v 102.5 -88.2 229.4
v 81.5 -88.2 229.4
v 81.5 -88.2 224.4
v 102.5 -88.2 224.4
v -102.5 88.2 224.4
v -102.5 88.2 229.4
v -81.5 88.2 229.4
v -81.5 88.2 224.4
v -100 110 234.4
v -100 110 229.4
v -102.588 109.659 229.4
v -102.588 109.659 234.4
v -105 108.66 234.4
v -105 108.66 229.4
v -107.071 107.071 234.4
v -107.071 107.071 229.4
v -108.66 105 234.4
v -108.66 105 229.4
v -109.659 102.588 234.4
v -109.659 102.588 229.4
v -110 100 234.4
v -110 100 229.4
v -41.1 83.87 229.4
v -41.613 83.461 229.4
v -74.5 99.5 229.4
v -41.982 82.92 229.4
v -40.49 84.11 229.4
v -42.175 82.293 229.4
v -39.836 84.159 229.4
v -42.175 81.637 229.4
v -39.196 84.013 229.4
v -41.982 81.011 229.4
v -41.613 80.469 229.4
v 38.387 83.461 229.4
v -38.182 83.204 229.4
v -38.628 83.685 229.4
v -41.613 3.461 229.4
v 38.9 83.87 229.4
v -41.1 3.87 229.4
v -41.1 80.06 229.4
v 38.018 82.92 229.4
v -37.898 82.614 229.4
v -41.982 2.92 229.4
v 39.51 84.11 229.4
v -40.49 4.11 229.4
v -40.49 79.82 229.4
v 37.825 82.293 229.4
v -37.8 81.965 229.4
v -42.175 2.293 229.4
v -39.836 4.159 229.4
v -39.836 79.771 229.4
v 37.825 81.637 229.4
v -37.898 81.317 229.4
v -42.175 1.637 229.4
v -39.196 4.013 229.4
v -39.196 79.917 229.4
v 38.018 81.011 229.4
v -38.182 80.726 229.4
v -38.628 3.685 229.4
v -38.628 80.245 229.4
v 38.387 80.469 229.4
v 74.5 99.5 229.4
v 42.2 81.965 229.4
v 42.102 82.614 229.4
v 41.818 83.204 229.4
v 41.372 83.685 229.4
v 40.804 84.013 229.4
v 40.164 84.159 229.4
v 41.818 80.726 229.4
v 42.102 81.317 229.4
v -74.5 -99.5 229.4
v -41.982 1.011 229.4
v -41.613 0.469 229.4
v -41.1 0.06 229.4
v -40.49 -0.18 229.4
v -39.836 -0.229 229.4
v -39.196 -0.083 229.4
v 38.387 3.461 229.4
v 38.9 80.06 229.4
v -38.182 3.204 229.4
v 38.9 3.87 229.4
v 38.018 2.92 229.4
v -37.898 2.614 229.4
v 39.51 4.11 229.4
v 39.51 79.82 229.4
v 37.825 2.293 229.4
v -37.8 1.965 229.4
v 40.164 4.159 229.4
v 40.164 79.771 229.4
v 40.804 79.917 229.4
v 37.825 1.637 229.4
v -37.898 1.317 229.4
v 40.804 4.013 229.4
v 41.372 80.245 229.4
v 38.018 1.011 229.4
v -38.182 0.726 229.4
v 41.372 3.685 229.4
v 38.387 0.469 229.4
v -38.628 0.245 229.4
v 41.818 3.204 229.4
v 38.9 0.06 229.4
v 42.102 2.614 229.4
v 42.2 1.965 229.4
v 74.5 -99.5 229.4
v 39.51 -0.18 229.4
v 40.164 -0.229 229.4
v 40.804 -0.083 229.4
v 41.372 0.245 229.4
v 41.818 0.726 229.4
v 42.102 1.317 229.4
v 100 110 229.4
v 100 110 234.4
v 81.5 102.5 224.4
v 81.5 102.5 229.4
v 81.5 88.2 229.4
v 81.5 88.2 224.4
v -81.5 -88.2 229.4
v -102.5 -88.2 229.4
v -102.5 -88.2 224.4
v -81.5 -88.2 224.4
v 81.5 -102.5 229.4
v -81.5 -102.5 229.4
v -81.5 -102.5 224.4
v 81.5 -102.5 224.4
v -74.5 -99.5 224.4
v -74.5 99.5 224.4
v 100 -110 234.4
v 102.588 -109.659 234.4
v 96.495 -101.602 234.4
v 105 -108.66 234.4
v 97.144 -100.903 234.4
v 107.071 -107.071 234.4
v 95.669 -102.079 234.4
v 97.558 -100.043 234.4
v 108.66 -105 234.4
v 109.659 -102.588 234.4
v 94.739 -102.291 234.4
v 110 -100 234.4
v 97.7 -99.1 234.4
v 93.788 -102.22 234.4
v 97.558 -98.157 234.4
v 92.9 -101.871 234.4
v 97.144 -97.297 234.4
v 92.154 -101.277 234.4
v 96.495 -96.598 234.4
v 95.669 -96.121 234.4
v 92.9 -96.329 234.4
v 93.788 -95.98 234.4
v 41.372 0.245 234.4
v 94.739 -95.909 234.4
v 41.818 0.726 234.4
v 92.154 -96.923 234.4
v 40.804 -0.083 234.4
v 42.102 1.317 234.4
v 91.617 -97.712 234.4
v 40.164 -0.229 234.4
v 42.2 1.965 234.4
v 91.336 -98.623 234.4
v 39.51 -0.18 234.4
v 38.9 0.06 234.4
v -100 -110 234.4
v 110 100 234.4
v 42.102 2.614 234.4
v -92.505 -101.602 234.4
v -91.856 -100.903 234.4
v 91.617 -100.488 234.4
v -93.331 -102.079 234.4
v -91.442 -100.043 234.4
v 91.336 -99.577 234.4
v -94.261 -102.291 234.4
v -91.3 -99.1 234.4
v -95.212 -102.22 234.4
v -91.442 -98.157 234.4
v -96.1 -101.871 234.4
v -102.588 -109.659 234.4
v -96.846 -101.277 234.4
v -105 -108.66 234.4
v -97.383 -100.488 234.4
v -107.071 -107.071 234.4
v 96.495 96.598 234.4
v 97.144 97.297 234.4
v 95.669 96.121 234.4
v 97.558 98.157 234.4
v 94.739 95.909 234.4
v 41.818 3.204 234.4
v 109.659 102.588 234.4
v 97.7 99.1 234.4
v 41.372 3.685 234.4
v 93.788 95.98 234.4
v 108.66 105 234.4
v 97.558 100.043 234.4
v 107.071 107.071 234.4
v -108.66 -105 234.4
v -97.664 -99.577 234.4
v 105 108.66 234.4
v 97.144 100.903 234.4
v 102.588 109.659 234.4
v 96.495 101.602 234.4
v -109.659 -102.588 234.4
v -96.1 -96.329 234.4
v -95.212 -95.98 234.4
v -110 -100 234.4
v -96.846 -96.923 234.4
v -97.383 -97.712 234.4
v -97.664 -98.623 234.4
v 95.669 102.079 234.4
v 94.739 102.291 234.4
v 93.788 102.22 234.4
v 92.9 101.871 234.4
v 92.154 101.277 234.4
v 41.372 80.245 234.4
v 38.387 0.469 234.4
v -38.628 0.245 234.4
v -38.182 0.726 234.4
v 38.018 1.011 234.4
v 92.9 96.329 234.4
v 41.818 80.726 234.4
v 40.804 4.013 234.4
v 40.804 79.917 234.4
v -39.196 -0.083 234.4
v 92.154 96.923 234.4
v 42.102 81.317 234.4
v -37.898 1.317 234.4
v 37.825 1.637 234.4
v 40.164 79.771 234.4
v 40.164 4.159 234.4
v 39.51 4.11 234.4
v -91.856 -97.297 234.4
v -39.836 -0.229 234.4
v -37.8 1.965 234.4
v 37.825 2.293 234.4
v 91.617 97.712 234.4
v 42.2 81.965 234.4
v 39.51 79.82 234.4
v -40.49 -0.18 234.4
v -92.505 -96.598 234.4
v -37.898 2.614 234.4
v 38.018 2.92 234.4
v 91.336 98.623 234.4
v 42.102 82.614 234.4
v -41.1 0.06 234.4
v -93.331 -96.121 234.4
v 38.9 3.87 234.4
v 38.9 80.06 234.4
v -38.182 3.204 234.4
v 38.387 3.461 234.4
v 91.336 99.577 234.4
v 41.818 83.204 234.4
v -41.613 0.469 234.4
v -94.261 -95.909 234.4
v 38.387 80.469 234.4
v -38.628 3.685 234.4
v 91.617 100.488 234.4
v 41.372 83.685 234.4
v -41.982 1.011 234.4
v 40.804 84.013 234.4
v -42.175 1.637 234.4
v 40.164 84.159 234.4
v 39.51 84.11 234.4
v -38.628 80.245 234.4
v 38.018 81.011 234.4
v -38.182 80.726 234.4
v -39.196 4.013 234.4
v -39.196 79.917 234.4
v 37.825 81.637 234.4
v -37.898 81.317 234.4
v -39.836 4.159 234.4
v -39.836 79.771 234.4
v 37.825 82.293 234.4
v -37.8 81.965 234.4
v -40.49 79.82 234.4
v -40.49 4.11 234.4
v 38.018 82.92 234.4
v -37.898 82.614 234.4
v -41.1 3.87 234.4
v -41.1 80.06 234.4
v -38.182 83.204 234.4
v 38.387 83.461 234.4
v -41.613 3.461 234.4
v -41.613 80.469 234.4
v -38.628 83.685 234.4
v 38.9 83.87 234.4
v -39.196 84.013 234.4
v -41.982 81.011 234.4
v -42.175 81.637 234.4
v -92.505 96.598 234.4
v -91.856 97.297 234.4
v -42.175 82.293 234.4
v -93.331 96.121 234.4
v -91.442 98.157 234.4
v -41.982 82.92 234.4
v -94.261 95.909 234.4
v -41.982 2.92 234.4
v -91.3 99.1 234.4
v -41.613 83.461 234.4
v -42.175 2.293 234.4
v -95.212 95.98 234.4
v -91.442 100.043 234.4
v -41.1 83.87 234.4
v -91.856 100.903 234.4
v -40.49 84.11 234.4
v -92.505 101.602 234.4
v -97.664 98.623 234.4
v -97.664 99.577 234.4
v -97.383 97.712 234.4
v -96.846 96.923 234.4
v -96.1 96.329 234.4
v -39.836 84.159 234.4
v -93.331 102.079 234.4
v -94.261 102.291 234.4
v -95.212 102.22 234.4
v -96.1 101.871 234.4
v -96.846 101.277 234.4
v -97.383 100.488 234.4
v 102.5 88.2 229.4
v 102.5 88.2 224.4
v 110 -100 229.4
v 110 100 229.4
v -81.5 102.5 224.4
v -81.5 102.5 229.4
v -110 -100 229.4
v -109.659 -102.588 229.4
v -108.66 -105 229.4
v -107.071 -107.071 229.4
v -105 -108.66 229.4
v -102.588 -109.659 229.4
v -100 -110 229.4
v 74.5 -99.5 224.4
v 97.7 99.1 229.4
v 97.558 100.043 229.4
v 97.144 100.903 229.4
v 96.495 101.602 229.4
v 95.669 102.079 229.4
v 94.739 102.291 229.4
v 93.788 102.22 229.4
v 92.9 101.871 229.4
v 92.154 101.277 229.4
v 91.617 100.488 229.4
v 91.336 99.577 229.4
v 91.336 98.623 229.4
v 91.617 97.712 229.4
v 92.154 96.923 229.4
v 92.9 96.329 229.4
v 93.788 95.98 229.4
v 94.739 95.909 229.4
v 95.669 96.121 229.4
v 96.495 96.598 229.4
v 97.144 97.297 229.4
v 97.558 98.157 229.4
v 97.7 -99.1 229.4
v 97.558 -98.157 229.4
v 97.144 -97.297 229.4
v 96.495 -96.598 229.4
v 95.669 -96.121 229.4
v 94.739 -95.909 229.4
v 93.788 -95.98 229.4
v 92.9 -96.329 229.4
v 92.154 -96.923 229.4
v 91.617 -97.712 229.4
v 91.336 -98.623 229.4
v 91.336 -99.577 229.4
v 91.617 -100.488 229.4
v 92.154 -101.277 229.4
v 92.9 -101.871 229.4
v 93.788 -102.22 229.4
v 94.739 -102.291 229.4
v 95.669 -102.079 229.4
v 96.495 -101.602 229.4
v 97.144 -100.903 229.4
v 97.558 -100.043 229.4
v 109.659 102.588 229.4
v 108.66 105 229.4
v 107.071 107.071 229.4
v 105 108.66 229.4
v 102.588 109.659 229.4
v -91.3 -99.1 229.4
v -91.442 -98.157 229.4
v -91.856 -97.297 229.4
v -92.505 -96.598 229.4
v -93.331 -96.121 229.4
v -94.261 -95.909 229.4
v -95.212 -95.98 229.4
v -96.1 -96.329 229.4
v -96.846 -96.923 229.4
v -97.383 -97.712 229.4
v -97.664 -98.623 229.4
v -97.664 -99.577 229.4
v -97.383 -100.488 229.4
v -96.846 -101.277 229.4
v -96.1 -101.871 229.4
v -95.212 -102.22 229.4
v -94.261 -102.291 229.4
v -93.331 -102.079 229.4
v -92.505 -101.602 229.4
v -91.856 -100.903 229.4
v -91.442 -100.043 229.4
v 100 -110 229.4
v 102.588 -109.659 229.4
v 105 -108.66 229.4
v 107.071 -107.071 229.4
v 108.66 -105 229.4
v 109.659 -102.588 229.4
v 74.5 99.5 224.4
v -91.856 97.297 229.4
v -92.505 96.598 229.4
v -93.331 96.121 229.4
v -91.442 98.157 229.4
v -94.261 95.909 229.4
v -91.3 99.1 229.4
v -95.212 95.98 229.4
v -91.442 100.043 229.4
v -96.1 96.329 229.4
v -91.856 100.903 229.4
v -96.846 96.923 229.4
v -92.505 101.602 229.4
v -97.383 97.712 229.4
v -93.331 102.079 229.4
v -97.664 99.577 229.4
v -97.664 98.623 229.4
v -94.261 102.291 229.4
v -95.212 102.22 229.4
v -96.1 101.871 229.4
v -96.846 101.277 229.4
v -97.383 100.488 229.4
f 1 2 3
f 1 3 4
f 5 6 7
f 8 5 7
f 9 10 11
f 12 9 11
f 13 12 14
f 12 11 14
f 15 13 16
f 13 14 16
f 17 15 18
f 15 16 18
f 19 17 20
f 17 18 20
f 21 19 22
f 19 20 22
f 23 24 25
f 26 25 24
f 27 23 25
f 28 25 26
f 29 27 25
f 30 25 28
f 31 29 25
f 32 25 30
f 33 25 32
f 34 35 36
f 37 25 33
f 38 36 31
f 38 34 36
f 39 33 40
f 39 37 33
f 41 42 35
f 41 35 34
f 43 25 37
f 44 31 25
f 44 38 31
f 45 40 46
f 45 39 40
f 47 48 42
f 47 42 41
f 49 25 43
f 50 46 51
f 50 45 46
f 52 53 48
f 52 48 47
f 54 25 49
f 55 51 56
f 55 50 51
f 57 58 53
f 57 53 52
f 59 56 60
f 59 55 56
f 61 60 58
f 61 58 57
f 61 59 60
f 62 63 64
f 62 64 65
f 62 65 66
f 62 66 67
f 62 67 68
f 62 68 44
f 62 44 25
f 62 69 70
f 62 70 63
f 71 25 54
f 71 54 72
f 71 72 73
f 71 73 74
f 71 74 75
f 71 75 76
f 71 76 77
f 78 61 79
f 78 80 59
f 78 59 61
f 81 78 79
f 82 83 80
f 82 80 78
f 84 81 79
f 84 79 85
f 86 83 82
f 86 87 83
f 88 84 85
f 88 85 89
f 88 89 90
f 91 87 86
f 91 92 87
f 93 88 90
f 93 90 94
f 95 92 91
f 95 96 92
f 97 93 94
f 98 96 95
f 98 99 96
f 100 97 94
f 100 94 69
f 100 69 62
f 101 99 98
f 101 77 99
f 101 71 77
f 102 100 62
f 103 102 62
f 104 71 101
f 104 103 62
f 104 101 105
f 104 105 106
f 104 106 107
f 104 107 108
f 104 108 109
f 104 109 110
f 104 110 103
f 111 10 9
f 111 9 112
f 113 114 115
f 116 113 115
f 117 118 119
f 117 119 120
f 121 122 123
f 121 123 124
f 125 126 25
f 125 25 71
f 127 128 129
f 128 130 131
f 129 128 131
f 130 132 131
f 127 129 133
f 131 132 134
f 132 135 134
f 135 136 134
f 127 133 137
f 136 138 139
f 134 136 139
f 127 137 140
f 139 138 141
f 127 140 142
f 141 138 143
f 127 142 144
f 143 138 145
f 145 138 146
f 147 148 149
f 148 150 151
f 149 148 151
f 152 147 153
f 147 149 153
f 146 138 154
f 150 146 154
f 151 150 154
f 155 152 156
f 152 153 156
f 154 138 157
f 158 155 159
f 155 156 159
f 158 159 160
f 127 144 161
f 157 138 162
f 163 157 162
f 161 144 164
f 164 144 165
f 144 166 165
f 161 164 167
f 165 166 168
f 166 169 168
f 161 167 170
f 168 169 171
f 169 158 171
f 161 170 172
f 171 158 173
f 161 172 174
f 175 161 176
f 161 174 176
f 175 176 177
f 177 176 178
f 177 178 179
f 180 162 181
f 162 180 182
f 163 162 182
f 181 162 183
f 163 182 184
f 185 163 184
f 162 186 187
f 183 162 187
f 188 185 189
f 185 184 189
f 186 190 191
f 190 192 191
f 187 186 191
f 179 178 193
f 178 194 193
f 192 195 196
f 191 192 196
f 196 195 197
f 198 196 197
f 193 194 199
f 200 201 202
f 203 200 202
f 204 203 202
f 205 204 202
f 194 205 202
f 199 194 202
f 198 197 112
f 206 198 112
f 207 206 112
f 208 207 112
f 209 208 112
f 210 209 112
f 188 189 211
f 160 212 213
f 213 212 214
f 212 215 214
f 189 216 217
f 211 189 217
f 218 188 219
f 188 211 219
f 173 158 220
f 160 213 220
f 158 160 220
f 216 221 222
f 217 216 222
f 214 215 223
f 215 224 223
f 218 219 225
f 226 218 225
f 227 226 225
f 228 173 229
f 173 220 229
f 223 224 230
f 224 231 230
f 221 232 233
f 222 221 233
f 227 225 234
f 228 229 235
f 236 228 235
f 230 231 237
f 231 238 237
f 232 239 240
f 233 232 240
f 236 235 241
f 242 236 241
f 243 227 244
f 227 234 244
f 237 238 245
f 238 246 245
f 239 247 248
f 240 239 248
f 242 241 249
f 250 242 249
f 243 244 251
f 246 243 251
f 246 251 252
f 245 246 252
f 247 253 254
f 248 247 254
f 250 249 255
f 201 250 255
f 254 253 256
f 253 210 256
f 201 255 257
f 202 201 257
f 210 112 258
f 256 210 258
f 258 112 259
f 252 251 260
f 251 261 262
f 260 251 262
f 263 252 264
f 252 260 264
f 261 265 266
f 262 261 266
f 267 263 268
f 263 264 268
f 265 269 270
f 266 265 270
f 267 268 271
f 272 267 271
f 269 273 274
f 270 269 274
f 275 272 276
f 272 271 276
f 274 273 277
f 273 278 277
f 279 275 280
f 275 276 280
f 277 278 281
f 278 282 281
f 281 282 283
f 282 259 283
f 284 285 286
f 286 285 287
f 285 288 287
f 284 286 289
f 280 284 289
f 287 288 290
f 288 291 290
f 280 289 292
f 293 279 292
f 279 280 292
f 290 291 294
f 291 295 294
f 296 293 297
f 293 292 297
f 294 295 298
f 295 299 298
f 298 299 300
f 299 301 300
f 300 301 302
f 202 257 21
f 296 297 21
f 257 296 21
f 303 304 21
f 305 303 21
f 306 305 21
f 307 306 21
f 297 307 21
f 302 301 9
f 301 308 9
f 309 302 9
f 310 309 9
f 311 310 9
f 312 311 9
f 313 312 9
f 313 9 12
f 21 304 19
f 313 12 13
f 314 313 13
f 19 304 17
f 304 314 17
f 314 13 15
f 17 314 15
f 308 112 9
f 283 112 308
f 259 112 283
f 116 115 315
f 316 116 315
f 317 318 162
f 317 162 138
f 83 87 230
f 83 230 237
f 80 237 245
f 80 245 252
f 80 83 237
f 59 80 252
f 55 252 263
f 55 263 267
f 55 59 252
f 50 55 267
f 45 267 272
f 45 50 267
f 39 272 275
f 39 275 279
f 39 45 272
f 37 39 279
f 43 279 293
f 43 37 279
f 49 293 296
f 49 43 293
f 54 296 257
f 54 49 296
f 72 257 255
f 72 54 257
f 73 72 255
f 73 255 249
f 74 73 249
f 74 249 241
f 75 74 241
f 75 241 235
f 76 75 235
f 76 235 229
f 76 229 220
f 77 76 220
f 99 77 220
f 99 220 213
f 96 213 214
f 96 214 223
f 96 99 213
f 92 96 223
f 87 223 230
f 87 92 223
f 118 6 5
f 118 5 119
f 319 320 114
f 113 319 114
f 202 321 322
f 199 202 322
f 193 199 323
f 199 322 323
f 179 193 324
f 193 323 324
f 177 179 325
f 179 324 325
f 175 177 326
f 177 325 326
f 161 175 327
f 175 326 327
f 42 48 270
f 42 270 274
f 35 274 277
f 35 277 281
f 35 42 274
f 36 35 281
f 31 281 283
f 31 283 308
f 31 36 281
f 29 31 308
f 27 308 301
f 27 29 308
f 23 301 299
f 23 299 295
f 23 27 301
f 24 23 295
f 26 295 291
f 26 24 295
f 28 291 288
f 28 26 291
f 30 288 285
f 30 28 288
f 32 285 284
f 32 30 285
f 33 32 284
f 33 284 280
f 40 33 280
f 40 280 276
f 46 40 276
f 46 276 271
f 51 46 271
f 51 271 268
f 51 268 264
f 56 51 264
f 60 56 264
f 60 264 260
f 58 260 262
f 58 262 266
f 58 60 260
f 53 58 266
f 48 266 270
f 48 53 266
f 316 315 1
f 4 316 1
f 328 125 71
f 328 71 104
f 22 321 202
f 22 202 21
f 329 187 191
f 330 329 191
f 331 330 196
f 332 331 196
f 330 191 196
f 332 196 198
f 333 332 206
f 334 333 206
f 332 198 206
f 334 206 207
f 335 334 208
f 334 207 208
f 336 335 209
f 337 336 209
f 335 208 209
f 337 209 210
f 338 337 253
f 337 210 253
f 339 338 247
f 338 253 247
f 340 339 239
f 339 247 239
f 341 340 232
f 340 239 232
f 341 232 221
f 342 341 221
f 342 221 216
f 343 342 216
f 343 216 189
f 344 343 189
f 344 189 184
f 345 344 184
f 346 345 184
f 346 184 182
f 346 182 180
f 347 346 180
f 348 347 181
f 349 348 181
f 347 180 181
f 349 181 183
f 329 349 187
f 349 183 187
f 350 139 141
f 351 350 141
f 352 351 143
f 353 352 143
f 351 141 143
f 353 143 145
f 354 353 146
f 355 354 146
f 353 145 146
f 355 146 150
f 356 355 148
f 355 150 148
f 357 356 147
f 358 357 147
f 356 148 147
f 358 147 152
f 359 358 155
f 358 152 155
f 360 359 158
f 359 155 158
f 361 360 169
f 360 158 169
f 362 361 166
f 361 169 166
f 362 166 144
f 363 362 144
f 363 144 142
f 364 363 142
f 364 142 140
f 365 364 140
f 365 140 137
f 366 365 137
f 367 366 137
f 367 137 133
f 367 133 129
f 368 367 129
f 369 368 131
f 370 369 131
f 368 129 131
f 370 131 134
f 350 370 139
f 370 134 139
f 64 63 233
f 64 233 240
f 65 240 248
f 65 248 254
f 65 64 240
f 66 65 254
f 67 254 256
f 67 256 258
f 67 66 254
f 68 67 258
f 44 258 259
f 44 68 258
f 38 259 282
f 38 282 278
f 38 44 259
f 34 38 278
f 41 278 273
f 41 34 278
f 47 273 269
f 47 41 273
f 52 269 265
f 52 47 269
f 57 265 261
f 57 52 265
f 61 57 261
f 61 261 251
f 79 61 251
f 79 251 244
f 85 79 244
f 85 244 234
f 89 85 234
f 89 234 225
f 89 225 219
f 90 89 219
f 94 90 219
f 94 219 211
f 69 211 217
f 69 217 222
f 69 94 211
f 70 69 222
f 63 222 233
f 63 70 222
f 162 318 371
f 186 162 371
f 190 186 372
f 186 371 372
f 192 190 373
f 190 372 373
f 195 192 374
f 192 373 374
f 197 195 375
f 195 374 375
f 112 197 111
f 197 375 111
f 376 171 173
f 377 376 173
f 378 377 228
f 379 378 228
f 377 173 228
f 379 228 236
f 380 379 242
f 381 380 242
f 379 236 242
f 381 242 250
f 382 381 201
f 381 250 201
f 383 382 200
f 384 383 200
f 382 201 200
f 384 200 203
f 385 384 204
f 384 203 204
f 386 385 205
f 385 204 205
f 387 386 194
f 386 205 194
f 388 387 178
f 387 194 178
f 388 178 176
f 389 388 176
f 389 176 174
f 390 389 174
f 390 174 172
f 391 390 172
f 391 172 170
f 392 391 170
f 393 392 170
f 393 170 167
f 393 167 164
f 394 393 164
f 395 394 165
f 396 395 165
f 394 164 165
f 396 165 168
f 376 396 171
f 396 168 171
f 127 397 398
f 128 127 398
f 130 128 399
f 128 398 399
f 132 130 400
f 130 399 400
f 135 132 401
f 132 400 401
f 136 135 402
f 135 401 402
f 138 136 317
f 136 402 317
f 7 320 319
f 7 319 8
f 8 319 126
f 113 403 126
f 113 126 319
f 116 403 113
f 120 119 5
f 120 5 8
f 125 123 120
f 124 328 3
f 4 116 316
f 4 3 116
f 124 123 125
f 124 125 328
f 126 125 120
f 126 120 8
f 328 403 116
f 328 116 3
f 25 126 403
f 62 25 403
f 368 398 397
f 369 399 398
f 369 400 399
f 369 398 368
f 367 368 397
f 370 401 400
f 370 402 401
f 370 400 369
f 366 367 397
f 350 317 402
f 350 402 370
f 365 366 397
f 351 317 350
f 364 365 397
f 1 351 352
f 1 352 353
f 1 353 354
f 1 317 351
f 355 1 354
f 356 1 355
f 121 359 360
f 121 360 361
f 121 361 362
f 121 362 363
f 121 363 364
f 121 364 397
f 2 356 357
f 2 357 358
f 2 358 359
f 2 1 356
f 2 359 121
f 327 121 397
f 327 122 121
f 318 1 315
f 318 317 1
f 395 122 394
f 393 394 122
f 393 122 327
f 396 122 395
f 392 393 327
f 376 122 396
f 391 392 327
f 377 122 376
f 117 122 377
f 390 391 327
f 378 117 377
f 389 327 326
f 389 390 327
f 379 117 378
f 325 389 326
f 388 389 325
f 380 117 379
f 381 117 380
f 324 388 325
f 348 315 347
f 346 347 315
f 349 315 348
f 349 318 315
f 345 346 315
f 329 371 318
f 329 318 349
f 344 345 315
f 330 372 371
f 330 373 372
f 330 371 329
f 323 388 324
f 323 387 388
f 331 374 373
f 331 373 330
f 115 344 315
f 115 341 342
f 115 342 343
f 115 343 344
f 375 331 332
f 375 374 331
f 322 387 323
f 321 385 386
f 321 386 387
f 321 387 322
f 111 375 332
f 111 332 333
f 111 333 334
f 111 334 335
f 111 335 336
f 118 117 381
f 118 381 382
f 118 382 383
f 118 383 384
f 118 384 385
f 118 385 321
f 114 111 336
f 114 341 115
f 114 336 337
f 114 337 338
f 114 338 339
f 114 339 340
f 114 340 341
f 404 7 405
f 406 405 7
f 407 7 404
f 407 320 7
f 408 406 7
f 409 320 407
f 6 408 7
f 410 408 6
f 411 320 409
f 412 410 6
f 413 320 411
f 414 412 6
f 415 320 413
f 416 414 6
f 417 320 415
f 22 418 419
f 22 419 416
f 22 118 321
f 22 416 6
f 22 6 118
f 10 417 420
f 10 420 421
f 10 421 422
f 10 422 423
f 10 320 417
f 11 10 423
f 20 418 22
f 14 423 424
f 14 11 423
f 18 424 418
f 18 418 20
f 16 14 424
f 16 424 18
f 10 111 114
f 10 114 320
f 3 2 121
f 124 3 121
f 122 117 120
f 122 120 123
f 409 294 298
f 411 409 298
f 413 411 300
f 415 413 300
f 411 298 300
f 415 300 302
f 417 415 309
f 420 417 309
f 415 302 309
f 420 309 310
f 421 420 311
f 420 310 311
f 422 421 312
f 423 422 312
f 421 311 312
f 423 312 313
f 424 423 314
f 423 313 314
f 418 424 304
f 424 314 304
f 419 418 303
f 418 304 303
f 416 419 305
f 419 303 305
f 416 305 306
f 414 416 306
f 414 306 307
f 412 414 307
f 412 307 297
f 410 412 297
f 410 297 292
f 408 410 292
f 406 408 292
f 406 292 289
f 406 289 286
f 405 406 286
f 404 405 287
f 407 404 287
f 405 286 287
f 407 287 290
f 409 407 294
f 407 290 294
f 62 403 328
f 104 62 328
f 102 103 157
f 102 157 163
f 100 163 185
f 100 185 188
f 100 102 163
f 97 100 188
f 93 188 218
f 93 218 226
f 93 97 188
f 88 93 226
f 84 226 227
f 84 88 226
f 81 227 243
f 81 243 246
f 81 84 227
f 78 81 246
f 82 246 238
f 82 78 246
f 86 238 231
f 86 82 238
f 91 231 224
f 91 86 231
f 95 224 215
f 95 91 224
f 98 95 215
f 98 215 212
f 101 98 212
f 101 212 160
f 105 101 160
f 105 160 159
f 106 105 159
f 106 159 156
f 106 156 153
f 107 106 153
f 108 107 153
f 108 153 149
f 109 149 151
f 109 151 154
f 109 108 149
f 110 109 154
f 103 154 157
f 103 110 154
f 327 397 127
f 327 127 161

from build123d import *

# Parameters (mm, degrees)
PAD006_DEPTH    = 5
SKETCH040_R     = 3.2
POCKET034_DEPTH = 5
SKETCH041_W     = 163
SKETCH041_H     = 205
PAD007_DEPTH    = 5
SKETCH042_W     = 205
SKETCH042_H     = 176.4
PAD008_DEPTH    = 5
SKETCH043_W     = 149
SKETCH043_H     = 199
POCKET035_DEPTH = 5
SKETCH049_R     = 2.2
POCKET040_DEPTH = 5


with BuildPart() as part:
    # Sketch039 → Pad006 (new body)
    with BuildSketch(Plane.XY):
        with BuildLine():
            Line((-100, 110), (100, 110))
            ThreePointArc((110, 100), (107.071068, 107.071068), (100, 110))
            Line((110, 100), (110, -100))
            ThreePointArc((100, -110), (107.071068, -107.071068), (110, -100))
            Line((100, -110), (-100, -110))
            ThreePointArc((-110, -100), (-107.071068, -107.071068), (-100, -110))
            Line((-110, -100), (-110, 100))
            ThreePointArc((-100, 110), (-107.071068, 107.071068), (-110, 100))
        make_face()
    extrude(amount=PAD006_DEPTH)

    # Sketch040 (on Face10 of Pad006) → Pocket034 (cut)
    with BuildSketch(Plane.XY.offset(5)):
        with Locations((-94.5, 99.1)):
            Circle(SKETCH040_R)
        with Locations((94.5, 99.1)):
            Circle(SKETCH040_R)
        with Locations((94.5, -99.1)):
            Circle(SKETCH040_R)
        with Locations((-94.5, -99.1)):
            Circle(SKETCH040_R)
    extrude(amount=-POCKET034_DEPTH, mode=Mode.SUBTRACT)

    # Sketch041 (on Face4 of Pocket034) → Pad007 (join)
    with BuildSketch(Plane(origin=(0, 0, 0), x_dir=(1, 0, 0), z_dir=(0, 0, -1))):
        Rectangle(SKETCH041_W, SKETCH041_H)
    extrude(amount=PAD007_DEPTH)

    # Sketch042 (on Face4 of Pocket034) → Pad008 (join)
    with BuildSketch(Plane(origin=(0, 0, 0), x_dir=(1, 0, 0), z_dir=(0, 0, -1))):
        Rectangle(SKETCH042_W, SKETCH042_H)
    extrude(amount=PAD008_DEPTH)

    # Sketch043 (on Face31 of Pad008) → Pocket035 (cut)
    with BuildSketch(Plane(origin=(0, 0, -5), x_dir=(1, 0, 0), z_dir=(0, 0, -1))):
        Rectangle(SKETCH043_W, SKETCH043_H)
    extrude(amount=-POCKET035_DEPTH, mode=Mode.SUBTRACT)

    # Sketch049 → Pocket040 (cut)
    with BuildSketch(Plane.XY):
        with Locations((-40, 81.965103)):
            Circle(SKETCH049_R)
        with Locations((40, 81.965103)):
            Circle(SKETCH049_R)
        with Locations((40, 1.965103)):
            Circle(SKETCH049_R)
        with Locations((-40, 1.965103)):
            Circle(SKETCH049_R)
    extrude(amount=POCKET040_DEPTH, mode=Mode.SUBTRACT)


with BuildPart() as part_1:
    # Body004 placement: moved
    add(part.part.moved(Location((0, 0, 229.4))))


solid = part_1.part
